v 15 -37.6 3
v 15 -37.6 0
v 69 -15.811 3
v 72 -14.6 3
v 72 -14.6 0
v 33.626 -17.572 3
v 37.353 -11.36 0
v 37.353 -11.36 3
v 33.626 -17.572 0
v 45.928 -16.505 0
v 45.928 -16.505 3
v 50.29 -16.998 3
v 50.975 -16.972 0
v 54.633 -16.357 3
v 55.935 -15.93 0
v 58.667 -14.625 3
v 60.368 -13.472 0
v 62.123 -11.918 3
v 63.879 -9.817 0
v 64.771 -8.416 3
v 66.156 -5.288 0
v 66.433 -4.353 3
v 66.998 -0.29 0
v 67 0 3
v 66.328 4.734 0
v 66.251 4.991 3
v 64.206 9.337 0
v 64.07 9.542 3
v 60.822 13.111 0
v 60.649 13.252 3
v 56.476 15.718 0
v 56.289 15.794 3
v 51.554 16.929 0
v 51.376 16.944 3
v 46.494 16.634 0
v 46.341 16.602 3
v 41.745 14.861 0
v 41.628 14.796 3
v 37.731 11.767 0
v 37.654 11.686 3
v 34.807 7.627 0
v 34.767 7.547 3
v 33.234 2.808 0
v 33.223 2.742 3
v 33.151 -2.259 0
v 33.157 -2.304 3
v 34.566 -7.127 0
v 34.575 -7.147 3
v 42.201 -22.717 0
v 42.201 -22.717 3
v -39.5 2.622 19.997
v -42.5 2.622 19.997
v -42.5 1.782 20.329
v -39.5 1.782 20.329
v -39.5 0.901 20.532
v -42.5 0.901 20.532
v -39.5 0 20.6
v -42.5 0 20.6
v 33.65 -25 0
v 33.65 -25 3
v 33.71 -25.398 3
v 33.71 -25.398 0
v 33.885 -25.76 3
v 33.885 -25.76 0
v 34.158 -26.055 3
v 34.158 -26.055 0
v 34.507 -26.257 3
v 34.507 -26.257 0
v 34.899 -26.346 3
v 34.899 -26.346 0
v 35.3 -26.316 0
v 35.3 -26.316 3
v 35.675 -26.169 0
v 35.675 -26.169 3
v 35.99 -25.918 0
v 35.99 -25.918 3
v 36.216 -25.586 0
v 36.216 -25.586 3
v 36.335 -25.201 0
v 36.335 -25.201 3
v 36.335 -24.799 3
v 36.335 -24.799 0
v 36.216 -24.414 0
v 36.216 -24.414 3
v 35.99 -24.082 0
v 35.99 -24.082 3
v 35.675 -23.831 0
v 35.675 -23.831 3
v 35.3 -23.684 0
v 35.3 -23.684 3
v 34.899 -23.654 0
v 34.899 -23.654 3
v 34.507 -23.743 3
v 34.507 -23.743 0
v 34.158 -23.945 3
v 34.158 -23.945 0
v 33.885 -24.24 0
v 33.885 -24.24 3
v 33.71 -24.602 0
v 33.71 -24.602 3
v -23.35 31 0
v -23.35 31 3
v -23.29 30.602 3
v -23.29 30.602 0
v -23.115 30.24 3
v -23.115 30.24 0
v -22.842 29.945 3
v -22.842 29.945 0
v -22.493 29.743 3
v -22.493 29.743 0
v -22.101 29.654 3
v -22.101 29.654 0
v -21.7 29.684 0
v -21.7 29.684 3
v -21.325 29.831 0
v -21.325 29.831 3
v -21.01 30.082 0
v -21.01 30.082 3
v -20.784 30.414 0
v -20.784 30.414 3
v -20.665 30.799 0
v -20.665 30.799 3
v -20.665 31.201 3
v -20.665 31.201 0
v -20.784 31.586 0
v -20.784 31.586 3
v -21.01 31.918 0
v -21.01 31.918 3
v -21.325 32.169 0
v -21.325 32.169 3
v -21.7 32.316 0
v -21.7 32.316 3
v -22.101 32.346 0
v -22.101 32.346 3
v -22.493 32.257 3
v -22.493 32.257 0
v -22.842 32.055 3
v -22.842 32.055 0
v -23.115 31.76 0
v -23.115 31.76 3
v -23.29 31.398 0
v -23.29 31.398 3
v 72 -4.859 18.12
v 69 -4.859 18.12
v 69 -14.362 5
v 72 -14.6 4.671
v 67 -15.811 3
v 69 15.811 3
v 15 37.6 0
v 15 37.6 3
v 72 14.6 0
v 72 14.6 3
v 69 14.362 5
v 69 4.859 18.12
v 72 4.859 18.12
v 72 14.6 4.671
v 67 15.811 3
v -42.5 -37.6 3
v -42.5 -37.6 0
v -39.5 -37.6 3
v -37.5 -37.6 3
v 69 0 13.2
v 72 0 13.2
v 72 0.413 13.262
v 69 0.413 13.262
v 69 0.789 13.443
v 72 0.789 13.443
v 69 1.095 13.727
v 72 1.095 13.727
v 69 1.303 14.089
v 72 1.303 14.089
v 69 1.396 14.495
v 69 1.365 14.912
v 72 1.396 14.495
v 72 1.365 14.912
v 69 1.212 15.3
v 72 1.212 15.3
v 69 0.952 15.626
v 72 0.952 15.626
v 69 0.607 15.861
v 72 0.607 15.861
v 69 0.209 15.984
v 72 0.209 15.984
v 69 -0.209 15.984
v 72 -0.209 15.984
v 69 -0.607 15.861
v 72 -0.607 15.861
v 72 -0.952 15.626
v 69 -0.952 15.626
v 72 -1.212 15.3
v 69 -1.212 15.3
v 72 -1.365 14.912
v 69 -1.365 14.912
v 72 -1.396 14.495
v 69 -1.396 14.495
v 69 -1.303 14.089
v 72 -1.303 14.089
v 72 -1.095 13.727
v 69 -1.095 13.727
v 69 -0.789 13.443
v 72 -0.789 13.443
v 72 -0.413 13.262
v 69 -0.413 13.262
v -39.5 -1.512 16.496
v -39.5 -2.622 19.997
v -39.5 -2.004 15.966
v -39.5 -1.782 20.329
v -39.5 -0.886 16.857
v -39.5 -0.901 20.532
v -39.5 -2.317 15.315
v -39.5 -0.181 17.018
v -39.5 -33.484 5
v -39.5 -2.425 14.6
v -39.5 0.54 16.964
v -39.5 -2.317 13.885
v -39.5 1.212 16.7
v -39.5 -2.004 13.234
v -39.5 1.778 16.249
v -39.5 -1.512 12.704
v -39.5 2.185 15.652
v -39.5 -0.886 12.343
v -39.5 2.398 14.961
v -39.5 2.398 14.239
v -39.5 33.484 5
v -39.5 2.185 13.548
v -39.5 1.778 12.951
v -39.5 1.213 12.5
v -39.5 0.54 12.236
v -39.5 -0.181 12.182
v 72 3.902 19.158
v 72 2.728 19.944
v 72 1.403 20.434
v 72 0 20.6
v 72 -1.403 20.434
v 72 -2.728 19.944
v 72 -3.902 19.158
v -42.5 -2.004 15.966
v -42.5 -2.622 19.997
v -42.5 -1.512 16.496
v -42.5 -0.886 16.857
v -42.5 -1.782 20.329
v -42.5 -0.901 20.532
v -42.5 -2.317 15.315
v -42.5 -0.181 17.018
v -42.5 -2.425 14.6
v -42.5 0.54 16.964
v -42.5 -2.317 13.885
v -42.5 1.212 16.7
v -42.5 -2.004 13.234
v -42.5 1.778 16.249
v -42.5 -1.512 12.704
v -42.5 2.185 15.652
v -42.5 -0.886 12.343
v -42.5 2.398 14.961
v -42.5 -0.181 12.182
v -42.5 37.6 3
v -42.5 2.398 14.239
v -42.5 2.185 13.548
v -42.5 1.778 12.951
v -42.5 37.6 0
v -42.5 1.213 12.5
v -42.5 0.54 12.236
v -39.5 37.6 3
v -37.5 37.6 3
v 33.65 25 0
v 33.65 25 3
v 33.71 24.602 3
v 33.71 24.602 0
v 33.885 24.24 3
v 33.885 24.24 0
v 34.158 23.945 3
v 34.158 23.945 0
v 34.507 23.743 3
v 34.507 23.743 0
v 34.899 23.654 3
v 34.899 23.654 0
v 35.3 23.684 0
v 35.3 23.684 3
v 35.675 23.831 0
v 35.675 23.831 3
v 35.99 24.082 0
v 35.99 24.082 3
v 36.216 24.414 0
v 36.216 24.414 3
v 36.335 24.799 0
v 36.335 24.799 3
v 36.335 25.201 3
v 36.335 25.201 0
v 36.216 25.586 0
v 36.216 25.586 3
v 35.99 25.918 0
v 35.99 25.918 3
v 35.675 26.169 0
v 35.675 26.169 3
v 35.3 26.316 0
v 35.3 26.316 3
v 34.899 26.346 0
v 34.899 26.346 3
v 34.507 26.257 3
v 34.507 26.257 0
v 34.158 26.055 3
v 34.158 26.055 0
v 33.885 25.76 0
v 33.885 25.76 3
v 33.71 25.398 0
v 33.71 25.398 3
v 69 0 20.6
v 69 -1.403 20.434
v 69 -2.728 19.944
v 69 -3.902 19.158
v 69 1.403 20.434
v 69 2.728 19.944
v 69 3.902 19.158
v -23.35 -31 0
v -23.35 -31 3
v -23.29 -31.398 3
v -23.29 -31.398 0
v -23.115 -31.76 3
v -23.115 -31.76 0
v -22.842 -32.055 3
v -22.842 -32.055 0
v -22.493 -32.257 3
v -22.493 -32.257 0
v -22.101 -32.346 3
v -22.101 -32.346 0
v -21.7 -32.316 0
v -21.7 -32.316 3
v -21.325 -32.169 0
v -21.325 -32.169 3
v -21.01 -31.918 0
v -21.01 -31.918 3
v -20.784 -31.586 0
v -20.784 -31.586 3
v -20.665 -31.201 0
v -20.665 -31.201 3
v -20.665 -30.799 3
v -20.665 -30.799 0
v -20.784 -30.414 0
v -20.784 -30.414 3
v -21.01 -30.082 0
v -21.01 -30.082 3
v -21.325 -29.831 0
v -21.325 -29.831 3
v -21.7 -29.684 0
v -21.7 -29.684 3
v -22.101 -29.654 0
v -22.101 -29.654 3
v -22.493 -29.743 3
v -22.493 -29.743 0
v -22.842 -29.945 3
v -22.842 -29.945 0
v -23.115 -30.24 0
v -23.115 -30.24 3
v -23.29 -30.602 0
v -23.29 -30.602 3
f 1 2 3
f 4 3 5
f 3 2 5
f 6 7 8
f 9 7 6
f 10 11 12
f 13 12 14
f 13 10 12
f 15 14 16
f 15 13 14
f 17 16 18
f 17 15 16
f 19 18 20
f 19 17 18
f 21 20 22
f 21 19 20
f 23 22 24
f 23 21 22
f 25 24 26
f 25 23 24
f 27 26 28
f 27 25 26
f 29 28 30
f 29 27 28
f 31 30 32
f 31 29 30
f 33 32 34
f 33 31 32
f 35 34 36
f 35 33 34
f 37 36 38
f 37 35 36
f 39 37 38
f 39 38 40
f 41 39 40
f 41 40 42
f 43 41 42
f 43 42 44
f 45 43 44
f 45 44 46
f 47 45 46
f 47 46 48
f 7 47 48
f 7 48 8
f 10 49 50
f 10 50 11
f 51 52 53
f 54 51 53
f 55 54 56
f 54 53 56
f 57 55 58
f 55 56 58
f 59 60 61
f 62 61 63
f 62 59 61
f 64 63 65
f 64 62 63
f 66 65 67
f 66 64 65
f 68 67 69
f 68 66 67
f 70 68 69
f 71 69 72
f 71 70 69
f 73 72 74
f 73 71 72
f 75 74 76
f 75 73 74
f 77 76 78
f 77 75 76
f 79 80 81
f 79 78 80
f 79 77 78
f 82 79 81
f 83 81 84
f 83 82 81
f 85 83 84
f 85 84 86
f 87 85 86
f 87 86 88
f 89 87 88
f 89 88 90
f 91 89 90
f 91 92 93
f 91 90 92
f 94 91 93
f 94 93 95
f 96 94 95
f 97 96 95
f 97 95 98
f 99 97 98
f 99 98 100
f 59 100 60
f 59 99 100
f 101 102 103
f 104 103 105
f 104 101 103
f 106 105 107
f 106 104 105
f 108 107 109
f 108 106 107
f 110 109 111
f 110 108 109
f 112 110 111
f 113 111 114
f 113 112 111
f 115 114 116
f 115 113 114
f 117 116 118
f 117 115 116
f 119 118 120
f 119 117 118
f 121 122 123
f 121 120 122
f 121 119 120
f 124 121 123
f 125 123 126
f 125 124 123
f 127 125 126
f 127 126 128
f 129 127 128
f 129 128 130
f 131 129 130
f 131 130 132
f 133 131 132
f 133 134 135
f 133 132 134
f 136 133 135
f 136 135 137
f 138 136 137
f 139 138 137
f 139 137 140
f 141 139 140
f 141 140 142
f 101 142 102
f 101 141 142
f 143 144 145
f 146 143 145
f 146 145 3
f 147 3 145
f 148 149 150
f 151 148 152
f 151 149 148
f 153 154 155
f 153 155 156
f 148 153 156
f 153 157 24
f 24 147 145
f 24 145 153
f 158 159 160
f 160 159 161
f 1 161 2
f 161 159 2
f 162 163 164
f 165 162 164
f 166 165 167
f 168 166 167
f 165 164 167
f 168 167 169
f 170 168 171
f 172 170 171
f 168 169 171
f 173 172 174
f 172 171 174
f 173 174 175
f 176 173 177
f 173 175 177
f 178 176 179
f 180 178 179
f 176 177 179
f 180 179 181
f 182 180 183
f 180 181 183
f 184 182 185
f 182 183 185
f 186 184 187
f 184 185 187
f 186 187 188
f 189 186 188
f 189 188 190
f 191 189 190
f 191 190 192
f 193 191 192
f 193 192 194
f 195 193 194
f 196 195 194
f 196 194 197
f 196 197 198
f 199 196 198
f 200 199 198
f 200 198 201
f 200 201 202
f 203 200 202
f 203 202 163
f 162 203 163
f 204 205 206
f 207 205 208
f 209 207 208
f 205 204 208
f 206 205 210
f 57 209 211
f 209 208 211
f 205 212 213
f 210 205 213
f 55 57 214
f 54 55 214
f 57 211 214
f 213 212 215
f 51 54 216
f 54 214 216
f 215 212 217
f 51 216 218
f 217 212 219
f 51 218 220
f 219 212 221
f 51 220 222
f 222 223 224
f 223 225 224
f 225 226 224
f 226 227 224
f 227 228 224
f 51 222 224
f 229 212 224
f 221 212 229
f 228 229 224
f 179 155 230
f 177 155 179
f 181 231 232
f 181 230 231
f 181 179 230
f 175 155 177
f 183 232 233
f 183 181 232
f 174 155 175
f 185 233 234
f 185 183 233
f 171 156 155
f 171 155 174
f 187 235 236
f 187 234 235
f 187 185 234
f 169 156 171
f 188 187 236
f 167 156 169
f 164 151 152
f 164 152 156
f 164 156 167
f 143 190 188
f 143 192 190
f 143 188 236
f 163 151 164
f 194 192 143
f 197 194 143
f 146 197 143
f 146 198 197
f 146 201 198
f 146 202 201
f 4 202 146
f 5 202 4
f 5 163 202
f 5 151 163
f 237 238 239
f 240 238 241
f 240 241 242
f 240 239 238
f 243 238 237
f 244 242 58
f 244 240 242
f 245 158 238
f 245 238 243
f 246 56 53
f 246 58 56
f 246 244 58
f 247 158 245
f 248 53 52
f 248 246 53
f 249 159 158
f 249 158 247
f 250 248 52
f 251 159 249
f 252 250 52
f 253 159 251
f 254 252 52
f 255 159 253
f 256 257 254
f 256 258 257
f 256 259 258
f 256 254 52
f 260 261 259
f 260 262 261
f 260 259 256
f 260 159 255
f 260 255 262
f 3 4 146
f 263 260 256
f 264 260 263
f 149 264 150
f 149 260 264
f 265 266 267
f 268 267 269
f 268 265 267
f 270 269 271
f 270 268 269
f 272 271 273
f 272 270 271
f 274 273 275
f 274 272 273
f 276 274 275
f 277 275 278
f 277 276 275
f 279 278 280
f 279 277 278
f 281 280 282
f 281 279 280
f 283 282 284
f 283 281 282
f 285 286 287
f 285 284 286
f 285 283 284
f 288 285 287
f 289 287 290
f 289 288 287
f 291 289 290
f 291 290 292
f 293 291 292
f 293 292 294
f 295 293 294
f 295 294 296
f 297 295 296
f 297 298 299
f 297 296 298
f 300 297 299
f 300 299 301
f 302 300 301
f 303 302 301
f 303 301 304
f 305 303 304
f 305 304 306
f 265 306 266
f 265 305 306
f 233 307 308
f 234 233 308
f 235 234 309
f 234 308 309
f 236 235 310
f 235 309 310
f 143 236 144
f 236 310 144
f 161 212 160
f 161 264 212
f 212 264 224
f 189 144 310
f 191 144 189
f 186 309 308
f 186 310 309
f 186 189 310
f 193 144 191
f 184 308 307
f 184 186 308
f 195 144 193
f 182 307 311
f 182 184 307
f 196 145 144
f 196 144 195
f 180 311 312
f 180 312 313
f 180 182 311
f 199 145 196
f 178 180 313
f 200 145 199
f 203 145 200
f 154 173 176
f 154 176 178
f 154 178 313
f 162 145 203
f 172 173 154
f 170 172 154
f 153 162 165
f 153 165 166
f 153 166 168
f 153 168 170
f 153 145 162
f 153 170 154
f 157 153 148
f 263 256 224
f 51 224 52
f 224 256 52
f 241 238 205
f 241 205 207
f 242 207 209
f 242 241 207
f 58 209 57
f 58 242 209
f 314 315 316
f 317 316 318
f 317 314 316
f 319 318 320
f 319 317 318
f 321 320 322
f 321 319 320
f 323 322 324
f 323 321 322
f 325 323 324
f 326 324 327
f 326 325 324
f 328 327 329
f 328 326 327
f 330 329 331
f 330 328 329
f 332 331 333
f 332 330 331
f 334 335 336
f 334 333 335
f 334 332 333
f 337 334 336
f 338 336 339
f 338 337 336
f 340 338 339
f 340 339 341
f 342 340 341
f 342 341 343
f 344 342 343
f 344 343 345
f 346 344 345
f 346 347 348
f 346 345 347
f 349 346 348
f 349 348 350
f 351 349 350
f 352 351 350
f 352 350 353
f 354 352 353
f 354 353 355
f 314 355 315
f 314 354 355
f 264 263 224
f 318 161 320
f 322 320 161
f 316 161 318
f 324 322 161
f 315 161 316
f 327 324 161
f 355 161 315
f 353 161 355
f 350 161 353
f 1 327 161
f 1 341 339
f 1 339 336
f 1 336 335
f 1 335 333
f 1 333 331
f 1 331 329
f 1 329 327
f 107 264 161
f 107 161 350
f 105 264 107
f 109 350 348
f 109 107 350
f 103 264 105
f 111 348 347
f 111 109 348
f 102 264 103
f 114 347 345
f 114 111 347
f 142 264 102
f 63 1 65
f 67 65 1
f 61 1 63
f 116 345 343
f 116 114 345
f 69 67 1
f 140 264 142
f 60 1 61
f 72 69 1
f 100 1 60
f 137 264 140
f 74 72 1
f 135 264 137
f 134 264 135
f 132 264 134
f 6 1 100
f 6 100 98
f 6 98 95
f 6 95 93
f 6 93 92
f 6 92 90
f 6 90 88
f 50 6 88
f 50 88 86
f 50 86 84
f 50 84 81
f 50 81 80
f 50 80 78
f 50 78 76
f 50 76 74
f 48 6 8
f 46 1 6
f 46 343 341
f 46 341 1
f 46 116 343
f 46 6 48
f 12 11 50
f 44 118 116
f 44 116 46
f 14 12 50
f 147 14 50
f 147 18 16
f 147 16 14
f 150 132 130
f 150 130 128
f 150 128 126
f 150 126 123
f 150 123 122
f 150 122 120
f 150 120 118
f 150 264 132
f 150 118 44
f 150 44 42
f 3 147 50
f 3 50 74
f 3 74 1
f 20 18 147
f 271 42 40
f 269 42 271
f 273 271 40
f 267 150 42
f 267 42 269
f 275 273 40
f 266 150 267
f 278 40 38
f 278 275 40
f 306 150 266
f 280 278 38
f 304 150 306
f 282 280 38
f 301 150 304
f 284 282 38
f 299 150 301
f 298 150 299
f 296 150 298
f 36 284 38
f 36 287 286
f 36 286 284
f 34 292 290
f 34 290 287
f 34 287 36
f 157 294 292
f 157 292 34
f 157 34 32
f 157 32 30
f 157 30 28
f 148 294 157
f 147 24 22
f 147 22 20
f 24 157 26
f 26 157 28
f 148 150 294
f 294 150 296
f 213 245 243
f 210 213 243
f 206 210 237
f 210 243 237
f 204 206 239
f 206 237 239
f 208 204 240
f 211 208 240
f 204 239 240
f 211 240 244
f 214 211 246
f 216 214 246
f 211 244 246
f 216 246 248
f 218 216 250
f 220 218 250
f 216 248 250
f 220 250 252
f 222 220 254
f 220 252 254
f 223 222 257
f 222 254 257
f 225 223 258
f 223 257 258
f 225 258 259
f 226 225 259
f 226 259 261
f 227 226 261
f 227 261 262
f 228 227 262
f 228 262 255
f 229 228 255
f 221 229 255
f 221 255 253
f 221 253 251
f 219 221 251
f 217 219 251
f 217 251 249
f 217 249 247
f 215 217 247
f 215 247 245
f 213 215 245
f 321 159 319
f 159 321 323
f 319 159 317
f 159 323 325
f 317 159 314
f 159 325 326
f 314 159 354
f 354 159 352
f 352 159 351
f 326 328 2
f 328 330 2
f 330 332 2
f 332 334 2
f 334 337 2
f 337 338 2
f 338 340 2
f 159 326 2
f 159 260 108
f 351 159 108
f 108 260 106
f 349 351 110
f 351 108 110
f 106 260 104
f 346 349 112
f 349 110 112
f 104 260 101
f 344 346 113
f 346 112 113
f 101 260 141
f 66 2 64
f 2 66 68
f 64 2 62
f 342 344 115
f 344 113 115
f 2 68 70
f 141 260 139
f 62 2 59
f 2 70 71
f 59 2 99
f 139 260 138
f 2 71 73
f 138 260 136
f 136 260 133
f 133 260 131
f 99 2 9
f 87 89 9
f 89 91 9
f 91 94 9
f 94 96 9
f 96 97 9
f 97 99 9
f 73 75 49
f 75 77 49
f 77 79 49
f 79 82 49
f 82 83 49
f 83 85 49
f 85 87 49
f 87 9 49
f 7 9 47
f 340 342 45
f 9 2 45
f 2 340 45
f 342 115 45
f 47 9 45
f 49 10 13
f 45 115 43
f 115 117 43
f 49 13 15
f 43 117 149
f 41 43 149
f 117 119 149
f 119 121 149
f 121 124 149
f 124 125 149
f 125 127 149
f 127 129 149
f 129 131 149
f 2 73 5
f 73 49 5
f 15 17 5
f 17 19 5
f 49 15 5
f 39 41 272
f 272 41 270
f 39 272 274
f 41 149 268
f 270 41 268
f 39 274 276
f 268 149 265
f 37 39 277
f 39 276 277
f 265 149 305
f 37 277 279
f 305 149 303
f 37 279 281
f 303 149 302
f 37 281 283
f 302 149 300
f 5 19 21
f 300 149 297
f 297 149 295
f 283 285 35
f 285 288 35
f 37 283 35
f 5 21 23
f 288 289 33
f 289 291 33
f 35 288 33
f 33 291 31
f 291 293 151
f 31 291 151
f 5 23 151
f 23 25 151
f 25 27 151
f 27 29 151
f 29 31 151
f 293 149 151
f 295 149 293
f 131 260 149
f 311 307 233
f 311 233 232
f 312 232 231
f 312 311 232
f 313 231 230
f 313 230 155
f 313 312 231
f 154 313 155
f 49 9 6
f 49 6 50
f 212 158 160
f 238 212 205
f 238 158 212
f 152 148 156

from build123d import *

# Parameters (mm, degrees)
SKETCH1_W           = 114.5
SKETCH1_H           = 75.2
BOSS_EXTRUDE1_DEPTH = 3
CUT_EXTRUDE1_REACH  = 83.282
SKETCH3_R           = 1.35
SKETCH5_W           = 3
SKETCH5_H           = 75.2
BOSS_EXTRUDE3_DEPTH = 17.6
CUT_EXTRUDE2_REACH  = 124.264
CUT_EXTRUDE3_REACH  = 124.264
CUT_EXTRUDE4_REACH  = 121.459
CUT_EXTRUDE5_REACH  = 121.459
CUT_EXTRUDE6_REACH  = 124.264
SKETCH10_R          = 2.425
CUT_EXTRUDE7_REACH  = 124.264
SKETCH11_R          = 1.4
CHAMFER1_SIZE       = 2


with BuildPart() as part:
    # Sketch1 → Boss-Extrude1 (new body)
    with BuildSketch(Plane.XY):
        with Locations((14.75, 0)):
            Rectangle(SKETCH1_W, SKETCH1_H)
    extrude(amount=BOSS_EXTRUDE1_DEPTH)

    # Sketch3 → Cut-Extrude1 (cut, up to next)
    with BuildSketch(Plane.XY, mode=Mode.PRIVATE) as cut_extrude1_sk1:
        with Locations(Location((35, 25, 0), (0, 0, 180))):
            Circle(SKETCH3_R)
    cut_extrude1_tool1 = extrude(cut_extrude1_sk1.sketch, amount=CUT_EXTRUDE1_REACH, mode=Mode.PRIVATE) & part.part
    # Sketch3 → Cut-Extrude1 (cut, up to next)
    with BuildSketch(Plane.XY, mode=Mode.PRIVATE) as cut_extrude1_sk2:
        with Locations(Location((-22, 31, 0), (0, 0, 180))):
            Circle(SKETCH3_R)
    cut_extrude1_tool2 = extrude(cut_extrude1_sk2.sketch, amount=CUT_EXTRUDE1_REACH, mode=Mode.PRIVATE) & part.part
    # Sketch3 → Cut-Extrude1 (cut, up to next)
    with BuildSketch(Plane.XY, mode=Mode.PRIVATE) as cut_extrude1_sk3:
        with Locations(Location((-22, -31, 0), (0, 0, 180))):
            Circle(SKETCH3_R)
    cut_extrude1_tool3 = extrude(cut_extrude1_sk3.sketch, amount=CUT_EXTRUDE1_REACH, mode=Mode.PRIVATE) & part.part
    # Sketch3 → Cut-Extrude1 (cut, up to next)
    with BuildSketch(Plane.XY, mode=Mode.PRIVATE) as cut_extrude1_sk4:
        with Locations(Location((35, -25, 0), (0, 0, 180))):
            Circle(SKETCH3_R)
    cut_extrude1_tool4 = extrude(cut_extrude1_sk4.sketch, amount=CUT_EXTRUDE1_REACH, mode=Mode.PRIVATE) & part.part
    # Sketch3 → Cut-Extrude1 (cut, up to next)
    with BuildSketch(Plane.XY, mode=Mode.PRIVATE) as cut_extrude1_sk5:
        with BuildLine():
            Line((37.352968819, -11.360132143), (33.626035358, -17.571687912))
            Line((33.626035358, -17.571687912), (42.200964615, -22.716645466))
            Line((42.200964615, -22.716645466), (45.927898076, -16.505089698))
            ThreePointArc((45.927898076, -16.505089698), (58.746427842, 14.577379737), (37.352968819, -11.360132143))
        make_face()
    cut_extrude1_tool5 = extrude(cut_extrude1_sk5.sketch, amount=CUT_EXTRUDE1_REACH, mode=Mode.PRIVATE) & part.part
    # Sketch3 → Cut-Extrude1 (cut, up to next)
    with BuildSketch(Plane.XY, mode=Mode.PRIVATE) as cut_extrude1_sk6:
        Polygon((15, -37.6), (72, -14.6), (72, -37.6), align=None)
    cut_extrude1_tool6 = extrude(cut_extrude1_sk6.sketch, amount=CUT_EXTRUDE1_REACH, mode=Mode.PRIVATE) & part.part
    # Sketch3 → Cut-Extrude1 (cut, up to next)
    with BuildSketch(Plane.XY, mode=Mode.PRIVATE) as cut_extrude1_sk7:
        Polygon((15, 37.6), (72, 14.6), (72, 37.6), align=None)
    cut_extrude1_tool7 = extrude(cut_extrude1_sk7.sketch, amount=CUT_EXTRUDE1_REACH, mode=Mode.PRIVATE) & part.part
    add(cut_extrude1_tool1.solids().sort_by_distance((35, 25, 0))[0], mode=Mode.SUBTRACT)
    add(cut_extrude1_tool2.solids().sort_by_distance((-22, 31, 0))[0], mode=Mode.SUBTRACT)
    add(cut_extrude1_tool3.solids().sort_by_distance((-22, -31, 0))[0], mode=Mode.SUBTRACT)
    add(cut_extrude1_tool4.solids().sort_by_distance((35, -25, 0))[0], mode=Mode.SUBTRACT)
    add(cut_extrude1_tool5.solids().sort_by_distance((49.284681, -1.192198, 0))[0], mode=Mode.SUBTRACT)
    add(cut_extrude1_tool6.solids().sort_by_distance((53, -29.933333, 0))[0], mode=Mode.SUBTRACT)
    add(cut_extrude1_tool7.solids().sort_by_distance((53, 29.933333, 0))[0], mode=Mode.SUBTRACT)

    # Sketch5 → Boss-Extrude3 (add)
    with BuildSketch(Plane.XY.offset(3)):
        Polygon((72, -14.6), (69, -15.810526316), (69, 15.810526316), (72, 14.6), align=None)
        with Locations((-41, 0)):
            Rectangle(SKETCH5_W, SKETCH5_H)
    extrude(amount=BOSS_EXTRUDE3_DEPTH)

    # Sketch6 → Cut-Extrude2 (cut, up to next)
    with BuildSketch(Plane.ZY.offset(42.5), mode=Mode.PRIVATE) as cut_extrude2_sk1:
        with BuildLine():
            Line((3, 37.6), (19.996596859, 2.62235435))
            ThreePointArc((19.996596859, 2.62235435), (20.447203655, 1.345440234), (20.6, 0))
            Line((20.6, 0), (20.6, 37.6))
            Line((20.6, 37.6), (3, 37.6))
        make_face()
    cut_extrude2_tool1 = extrude(cut_extrude2_sk1.sketch, amount=-CUT_EXTRUDE2_REACH, mode=Mode.PRIVATE) & part.part
    add(cut_extrude2_tool1.solids().sort_by_distance((-42.5, 25.516122, 14.735887))[0], mode=Mode.SUBTRACT)

    # Sketch7 → Cut-Extrude3 (cut, up to next)
    with BuildSketch(Plane.ZY.offset(42.5), mode=Mode.PRIVATE) as cut_extrude3_sk1:
        with BuildLine():
            Line((20.6, 0), (20.6, -37.6))
            Line((20.6, -37.6), (3, -37.6))
            Line((3, -37.6), (19.996596859, -2.62235435))
            ThreePointArc((19.996596859, -2.62235435), (20.447203655, -1.345440234), (20.6, 0))
        make_face()
    cut_extrude3_tool1 = extrude(cut_extrude3_sk1.sketch, amount=-CUT_EXTRUDE3_REACH, mode=Mode.PRIVATE) & part.part
    add(cut_extrude3_tool1.solids().sort_by_distance((-42.5, -25.516122, 14.735887))[0], mode=Mode.SUBTRACT)

    # Sketch8 → Cut-Extrude4 (cut, up to next)
    with BuildSketch(Plane.ZY.offset(-69), mode=Mode.PRIVATE) as cut_extrude4_sk1:
        with BuildLine():
            Line((18.119604827, 4.859257336), (3, 15.810526316))
            Line((3, 15.810526316), (20.6, 15.810526316))
            Line((20.6, 15.810526316), (20.6, 0))
            ThreePointArc((20.6, 0), (19.944044768, 2.727853647), (18.119604827, 4.859257336))
        make_face()
    cut_extrude4_tool1 = extrude(cut_extrude4_sk1.sketch, amount=-CUT_EXTRUDE4_REACH, mode=Mode.PRIVATE) & part.part
    add(cut_extrude4_tool1.solids().sort_by_distance((69, 11.454378, 14.798599))[0], mode=Mode.SUBTRACT)

    # Sketch9 → Cut-Extrude5 (cut, up to next)
    with BuildSketch(Plane.ZY.offset(-69), mode=Mode.PRIVATE) as cut_extrude5_sk1:
        with BuildLine():
            Line((18.119604827, -4.859257336), (3, -15.810526316))
            Line((3, -15.810526316), (20.6, -15.810526316))
            Line((20.6, -15.810526316), (20.6, 0))
            ThreePointArc((20.6, 0), (19.944044768, -2.727853647), (18.119604827, -4.859257336))
        make_face()
    cut_extrude5_tool1 = extrude(cut_extrude5_sk1.sketch, amount=-CUT_EXTRUDE5_REACH, mode=Mode.PRIVATE) & part.part
    add(cut_extrude5_tool1.solids().sort_by_distance((69, -11.454378, 14.798599))[0], mode=Mode.SUBTRACT)

    # Sketch10 → Cut-Extrude6 (cut, up to next)
    with BuildSketch(Plane.ZY.offset(42.5), mode=Mode.PRIVATE) as cut_extrude6_sk1:
        with Locations(Location((14.6, 0, 0), (0, 0, 270))):
            Circle(SKETCH10_R)
    cut_extrude6_tool1 = extrude(cut_extrude6_sk1.sketch, amount=-CUT_EXTRUDE6_REACH, mode=Mode.PRIVATE) & part.part
    add(cut_extrude6_tool1.solids().sort_by_distance((-42.5, 0, 14.6))[0], mode=Mode.SUBTRACT)

    # Sketch11 → Cut-Extrude7 (cut, up to next)
    with BuildSketch(Plane(origin=(72, 0, 0), x_dir=(0, 0, -1), z_dir=(1, 0, 0)), mode=Mode.PRIVATE) as cut_extrude7_sk1:
        with Locations((-14.6, 0)):
            Circle(SKETCH11_R)
    cut_extrude7_tool1 = extrude(cut_extrude7_sk1.sketch, amount=-CUT_EXTRUDE7_REACH, mode=Mode.PRIVATE) & part.part
    add(cut_extrude7_tool1.solids().sort_by_distance((72, 0, 14.6))[0], mode=Mode.SUBTRACT)

    # Chamfer1
    # the kernel refuses this chamfer: 2 mm, written as the material it adds along each edge
    with BuildSketch(Plane(origin=(69, -20.953892292, 3), x_dir=(-0.9996219169112968, 0, -0.0274958766105862), z_dir=(0, 1, 0))) as chamfer1_piece_1_section:
        Polygon((CHAMFER1_SIZE * 0.999621916911, CHAMFER1_SIZE * 0.0274958766106), (-CHAMFER1_SIZE * 0.0274958766106, CHAMFER1_SIZE * 0.999621916911), (0, 0), align=None)
    chamfer1_piece_1 = extrude(amount=41.907784583, mode=Mode.PRIVATE)
    chamfer1_piece_1 = chamfer1_piece_1 - Plane(origin=(50, 0, 3.647655416), x_dir=(-0.23953540727459496, -0.9708876292660207, 0), z_dir=(0, 0, -1)) * Cylinder(17, 92, mode=Mode.PRIVATE)
    chamfer1_piece_1 = split(chamfer1_piece_1, bisect_by=Plane(origin=(68.334125846, -10.062431967, 10.935967533), z_dir=(0, 0.8098762227411254, -0.5866008044987383)), keep=Keep.TOP, mode=Mode.PRIVATE)
    chamfer1_piece_1 = split(chamfer1_piece_1, bisect_by=Plane(origin=(68.334125846, 10.062431967, 10.935967533), z_dir=(0, -0.8098762227411249, -0.5866008044987391)), keep=Keep.TOP, mode=Mode.PRIVATE)
    add(chamfer1_piece_1)
    with BuildSketch(Plane(origin=(-39.5, -37.6, 3), x_dir=(0.9996219169112968, 0, -0.027495876610586296), z_dir=(0, 1, 0))) as chamfer1_piece_2_section:
        Polygon((CHAMFER1_SIZE * 0.999621916911, -CHAMFER1_SIZE * 0.0274958766106), (-CHAMFER1_SIZE * 0.0274958766106, -CHAMFER1_SIZE * 0.999621916911), (0, 0), align=None)
    chamfer1_piece_2 = extrude(amount=75.2, mode=Mode.PRIVATE)
    chamfer1_piece_2 = split(chamfer1_piece_2, bisect_by=Plane(origin=(-38.832756729, 6.928738124, 17.904006933), z_dir=(0, -0.4370590583687447, -0.8994328098851111)), keep=Keep.TOP, mode=Mode.PRIVATE)
    chamfer1_piece_2 = split(chamfer1_piece_2, bisect_by=Plane(origin=(-38.832756729, -6.928738124, 17.904006933), z_dir=(0, 0.4370590583688008, -0.8994328098850838)), keep=Keep.TOP, mode=Mode.PRIVATE)
    add(chamfer1_piece_2)


solid = part.part
